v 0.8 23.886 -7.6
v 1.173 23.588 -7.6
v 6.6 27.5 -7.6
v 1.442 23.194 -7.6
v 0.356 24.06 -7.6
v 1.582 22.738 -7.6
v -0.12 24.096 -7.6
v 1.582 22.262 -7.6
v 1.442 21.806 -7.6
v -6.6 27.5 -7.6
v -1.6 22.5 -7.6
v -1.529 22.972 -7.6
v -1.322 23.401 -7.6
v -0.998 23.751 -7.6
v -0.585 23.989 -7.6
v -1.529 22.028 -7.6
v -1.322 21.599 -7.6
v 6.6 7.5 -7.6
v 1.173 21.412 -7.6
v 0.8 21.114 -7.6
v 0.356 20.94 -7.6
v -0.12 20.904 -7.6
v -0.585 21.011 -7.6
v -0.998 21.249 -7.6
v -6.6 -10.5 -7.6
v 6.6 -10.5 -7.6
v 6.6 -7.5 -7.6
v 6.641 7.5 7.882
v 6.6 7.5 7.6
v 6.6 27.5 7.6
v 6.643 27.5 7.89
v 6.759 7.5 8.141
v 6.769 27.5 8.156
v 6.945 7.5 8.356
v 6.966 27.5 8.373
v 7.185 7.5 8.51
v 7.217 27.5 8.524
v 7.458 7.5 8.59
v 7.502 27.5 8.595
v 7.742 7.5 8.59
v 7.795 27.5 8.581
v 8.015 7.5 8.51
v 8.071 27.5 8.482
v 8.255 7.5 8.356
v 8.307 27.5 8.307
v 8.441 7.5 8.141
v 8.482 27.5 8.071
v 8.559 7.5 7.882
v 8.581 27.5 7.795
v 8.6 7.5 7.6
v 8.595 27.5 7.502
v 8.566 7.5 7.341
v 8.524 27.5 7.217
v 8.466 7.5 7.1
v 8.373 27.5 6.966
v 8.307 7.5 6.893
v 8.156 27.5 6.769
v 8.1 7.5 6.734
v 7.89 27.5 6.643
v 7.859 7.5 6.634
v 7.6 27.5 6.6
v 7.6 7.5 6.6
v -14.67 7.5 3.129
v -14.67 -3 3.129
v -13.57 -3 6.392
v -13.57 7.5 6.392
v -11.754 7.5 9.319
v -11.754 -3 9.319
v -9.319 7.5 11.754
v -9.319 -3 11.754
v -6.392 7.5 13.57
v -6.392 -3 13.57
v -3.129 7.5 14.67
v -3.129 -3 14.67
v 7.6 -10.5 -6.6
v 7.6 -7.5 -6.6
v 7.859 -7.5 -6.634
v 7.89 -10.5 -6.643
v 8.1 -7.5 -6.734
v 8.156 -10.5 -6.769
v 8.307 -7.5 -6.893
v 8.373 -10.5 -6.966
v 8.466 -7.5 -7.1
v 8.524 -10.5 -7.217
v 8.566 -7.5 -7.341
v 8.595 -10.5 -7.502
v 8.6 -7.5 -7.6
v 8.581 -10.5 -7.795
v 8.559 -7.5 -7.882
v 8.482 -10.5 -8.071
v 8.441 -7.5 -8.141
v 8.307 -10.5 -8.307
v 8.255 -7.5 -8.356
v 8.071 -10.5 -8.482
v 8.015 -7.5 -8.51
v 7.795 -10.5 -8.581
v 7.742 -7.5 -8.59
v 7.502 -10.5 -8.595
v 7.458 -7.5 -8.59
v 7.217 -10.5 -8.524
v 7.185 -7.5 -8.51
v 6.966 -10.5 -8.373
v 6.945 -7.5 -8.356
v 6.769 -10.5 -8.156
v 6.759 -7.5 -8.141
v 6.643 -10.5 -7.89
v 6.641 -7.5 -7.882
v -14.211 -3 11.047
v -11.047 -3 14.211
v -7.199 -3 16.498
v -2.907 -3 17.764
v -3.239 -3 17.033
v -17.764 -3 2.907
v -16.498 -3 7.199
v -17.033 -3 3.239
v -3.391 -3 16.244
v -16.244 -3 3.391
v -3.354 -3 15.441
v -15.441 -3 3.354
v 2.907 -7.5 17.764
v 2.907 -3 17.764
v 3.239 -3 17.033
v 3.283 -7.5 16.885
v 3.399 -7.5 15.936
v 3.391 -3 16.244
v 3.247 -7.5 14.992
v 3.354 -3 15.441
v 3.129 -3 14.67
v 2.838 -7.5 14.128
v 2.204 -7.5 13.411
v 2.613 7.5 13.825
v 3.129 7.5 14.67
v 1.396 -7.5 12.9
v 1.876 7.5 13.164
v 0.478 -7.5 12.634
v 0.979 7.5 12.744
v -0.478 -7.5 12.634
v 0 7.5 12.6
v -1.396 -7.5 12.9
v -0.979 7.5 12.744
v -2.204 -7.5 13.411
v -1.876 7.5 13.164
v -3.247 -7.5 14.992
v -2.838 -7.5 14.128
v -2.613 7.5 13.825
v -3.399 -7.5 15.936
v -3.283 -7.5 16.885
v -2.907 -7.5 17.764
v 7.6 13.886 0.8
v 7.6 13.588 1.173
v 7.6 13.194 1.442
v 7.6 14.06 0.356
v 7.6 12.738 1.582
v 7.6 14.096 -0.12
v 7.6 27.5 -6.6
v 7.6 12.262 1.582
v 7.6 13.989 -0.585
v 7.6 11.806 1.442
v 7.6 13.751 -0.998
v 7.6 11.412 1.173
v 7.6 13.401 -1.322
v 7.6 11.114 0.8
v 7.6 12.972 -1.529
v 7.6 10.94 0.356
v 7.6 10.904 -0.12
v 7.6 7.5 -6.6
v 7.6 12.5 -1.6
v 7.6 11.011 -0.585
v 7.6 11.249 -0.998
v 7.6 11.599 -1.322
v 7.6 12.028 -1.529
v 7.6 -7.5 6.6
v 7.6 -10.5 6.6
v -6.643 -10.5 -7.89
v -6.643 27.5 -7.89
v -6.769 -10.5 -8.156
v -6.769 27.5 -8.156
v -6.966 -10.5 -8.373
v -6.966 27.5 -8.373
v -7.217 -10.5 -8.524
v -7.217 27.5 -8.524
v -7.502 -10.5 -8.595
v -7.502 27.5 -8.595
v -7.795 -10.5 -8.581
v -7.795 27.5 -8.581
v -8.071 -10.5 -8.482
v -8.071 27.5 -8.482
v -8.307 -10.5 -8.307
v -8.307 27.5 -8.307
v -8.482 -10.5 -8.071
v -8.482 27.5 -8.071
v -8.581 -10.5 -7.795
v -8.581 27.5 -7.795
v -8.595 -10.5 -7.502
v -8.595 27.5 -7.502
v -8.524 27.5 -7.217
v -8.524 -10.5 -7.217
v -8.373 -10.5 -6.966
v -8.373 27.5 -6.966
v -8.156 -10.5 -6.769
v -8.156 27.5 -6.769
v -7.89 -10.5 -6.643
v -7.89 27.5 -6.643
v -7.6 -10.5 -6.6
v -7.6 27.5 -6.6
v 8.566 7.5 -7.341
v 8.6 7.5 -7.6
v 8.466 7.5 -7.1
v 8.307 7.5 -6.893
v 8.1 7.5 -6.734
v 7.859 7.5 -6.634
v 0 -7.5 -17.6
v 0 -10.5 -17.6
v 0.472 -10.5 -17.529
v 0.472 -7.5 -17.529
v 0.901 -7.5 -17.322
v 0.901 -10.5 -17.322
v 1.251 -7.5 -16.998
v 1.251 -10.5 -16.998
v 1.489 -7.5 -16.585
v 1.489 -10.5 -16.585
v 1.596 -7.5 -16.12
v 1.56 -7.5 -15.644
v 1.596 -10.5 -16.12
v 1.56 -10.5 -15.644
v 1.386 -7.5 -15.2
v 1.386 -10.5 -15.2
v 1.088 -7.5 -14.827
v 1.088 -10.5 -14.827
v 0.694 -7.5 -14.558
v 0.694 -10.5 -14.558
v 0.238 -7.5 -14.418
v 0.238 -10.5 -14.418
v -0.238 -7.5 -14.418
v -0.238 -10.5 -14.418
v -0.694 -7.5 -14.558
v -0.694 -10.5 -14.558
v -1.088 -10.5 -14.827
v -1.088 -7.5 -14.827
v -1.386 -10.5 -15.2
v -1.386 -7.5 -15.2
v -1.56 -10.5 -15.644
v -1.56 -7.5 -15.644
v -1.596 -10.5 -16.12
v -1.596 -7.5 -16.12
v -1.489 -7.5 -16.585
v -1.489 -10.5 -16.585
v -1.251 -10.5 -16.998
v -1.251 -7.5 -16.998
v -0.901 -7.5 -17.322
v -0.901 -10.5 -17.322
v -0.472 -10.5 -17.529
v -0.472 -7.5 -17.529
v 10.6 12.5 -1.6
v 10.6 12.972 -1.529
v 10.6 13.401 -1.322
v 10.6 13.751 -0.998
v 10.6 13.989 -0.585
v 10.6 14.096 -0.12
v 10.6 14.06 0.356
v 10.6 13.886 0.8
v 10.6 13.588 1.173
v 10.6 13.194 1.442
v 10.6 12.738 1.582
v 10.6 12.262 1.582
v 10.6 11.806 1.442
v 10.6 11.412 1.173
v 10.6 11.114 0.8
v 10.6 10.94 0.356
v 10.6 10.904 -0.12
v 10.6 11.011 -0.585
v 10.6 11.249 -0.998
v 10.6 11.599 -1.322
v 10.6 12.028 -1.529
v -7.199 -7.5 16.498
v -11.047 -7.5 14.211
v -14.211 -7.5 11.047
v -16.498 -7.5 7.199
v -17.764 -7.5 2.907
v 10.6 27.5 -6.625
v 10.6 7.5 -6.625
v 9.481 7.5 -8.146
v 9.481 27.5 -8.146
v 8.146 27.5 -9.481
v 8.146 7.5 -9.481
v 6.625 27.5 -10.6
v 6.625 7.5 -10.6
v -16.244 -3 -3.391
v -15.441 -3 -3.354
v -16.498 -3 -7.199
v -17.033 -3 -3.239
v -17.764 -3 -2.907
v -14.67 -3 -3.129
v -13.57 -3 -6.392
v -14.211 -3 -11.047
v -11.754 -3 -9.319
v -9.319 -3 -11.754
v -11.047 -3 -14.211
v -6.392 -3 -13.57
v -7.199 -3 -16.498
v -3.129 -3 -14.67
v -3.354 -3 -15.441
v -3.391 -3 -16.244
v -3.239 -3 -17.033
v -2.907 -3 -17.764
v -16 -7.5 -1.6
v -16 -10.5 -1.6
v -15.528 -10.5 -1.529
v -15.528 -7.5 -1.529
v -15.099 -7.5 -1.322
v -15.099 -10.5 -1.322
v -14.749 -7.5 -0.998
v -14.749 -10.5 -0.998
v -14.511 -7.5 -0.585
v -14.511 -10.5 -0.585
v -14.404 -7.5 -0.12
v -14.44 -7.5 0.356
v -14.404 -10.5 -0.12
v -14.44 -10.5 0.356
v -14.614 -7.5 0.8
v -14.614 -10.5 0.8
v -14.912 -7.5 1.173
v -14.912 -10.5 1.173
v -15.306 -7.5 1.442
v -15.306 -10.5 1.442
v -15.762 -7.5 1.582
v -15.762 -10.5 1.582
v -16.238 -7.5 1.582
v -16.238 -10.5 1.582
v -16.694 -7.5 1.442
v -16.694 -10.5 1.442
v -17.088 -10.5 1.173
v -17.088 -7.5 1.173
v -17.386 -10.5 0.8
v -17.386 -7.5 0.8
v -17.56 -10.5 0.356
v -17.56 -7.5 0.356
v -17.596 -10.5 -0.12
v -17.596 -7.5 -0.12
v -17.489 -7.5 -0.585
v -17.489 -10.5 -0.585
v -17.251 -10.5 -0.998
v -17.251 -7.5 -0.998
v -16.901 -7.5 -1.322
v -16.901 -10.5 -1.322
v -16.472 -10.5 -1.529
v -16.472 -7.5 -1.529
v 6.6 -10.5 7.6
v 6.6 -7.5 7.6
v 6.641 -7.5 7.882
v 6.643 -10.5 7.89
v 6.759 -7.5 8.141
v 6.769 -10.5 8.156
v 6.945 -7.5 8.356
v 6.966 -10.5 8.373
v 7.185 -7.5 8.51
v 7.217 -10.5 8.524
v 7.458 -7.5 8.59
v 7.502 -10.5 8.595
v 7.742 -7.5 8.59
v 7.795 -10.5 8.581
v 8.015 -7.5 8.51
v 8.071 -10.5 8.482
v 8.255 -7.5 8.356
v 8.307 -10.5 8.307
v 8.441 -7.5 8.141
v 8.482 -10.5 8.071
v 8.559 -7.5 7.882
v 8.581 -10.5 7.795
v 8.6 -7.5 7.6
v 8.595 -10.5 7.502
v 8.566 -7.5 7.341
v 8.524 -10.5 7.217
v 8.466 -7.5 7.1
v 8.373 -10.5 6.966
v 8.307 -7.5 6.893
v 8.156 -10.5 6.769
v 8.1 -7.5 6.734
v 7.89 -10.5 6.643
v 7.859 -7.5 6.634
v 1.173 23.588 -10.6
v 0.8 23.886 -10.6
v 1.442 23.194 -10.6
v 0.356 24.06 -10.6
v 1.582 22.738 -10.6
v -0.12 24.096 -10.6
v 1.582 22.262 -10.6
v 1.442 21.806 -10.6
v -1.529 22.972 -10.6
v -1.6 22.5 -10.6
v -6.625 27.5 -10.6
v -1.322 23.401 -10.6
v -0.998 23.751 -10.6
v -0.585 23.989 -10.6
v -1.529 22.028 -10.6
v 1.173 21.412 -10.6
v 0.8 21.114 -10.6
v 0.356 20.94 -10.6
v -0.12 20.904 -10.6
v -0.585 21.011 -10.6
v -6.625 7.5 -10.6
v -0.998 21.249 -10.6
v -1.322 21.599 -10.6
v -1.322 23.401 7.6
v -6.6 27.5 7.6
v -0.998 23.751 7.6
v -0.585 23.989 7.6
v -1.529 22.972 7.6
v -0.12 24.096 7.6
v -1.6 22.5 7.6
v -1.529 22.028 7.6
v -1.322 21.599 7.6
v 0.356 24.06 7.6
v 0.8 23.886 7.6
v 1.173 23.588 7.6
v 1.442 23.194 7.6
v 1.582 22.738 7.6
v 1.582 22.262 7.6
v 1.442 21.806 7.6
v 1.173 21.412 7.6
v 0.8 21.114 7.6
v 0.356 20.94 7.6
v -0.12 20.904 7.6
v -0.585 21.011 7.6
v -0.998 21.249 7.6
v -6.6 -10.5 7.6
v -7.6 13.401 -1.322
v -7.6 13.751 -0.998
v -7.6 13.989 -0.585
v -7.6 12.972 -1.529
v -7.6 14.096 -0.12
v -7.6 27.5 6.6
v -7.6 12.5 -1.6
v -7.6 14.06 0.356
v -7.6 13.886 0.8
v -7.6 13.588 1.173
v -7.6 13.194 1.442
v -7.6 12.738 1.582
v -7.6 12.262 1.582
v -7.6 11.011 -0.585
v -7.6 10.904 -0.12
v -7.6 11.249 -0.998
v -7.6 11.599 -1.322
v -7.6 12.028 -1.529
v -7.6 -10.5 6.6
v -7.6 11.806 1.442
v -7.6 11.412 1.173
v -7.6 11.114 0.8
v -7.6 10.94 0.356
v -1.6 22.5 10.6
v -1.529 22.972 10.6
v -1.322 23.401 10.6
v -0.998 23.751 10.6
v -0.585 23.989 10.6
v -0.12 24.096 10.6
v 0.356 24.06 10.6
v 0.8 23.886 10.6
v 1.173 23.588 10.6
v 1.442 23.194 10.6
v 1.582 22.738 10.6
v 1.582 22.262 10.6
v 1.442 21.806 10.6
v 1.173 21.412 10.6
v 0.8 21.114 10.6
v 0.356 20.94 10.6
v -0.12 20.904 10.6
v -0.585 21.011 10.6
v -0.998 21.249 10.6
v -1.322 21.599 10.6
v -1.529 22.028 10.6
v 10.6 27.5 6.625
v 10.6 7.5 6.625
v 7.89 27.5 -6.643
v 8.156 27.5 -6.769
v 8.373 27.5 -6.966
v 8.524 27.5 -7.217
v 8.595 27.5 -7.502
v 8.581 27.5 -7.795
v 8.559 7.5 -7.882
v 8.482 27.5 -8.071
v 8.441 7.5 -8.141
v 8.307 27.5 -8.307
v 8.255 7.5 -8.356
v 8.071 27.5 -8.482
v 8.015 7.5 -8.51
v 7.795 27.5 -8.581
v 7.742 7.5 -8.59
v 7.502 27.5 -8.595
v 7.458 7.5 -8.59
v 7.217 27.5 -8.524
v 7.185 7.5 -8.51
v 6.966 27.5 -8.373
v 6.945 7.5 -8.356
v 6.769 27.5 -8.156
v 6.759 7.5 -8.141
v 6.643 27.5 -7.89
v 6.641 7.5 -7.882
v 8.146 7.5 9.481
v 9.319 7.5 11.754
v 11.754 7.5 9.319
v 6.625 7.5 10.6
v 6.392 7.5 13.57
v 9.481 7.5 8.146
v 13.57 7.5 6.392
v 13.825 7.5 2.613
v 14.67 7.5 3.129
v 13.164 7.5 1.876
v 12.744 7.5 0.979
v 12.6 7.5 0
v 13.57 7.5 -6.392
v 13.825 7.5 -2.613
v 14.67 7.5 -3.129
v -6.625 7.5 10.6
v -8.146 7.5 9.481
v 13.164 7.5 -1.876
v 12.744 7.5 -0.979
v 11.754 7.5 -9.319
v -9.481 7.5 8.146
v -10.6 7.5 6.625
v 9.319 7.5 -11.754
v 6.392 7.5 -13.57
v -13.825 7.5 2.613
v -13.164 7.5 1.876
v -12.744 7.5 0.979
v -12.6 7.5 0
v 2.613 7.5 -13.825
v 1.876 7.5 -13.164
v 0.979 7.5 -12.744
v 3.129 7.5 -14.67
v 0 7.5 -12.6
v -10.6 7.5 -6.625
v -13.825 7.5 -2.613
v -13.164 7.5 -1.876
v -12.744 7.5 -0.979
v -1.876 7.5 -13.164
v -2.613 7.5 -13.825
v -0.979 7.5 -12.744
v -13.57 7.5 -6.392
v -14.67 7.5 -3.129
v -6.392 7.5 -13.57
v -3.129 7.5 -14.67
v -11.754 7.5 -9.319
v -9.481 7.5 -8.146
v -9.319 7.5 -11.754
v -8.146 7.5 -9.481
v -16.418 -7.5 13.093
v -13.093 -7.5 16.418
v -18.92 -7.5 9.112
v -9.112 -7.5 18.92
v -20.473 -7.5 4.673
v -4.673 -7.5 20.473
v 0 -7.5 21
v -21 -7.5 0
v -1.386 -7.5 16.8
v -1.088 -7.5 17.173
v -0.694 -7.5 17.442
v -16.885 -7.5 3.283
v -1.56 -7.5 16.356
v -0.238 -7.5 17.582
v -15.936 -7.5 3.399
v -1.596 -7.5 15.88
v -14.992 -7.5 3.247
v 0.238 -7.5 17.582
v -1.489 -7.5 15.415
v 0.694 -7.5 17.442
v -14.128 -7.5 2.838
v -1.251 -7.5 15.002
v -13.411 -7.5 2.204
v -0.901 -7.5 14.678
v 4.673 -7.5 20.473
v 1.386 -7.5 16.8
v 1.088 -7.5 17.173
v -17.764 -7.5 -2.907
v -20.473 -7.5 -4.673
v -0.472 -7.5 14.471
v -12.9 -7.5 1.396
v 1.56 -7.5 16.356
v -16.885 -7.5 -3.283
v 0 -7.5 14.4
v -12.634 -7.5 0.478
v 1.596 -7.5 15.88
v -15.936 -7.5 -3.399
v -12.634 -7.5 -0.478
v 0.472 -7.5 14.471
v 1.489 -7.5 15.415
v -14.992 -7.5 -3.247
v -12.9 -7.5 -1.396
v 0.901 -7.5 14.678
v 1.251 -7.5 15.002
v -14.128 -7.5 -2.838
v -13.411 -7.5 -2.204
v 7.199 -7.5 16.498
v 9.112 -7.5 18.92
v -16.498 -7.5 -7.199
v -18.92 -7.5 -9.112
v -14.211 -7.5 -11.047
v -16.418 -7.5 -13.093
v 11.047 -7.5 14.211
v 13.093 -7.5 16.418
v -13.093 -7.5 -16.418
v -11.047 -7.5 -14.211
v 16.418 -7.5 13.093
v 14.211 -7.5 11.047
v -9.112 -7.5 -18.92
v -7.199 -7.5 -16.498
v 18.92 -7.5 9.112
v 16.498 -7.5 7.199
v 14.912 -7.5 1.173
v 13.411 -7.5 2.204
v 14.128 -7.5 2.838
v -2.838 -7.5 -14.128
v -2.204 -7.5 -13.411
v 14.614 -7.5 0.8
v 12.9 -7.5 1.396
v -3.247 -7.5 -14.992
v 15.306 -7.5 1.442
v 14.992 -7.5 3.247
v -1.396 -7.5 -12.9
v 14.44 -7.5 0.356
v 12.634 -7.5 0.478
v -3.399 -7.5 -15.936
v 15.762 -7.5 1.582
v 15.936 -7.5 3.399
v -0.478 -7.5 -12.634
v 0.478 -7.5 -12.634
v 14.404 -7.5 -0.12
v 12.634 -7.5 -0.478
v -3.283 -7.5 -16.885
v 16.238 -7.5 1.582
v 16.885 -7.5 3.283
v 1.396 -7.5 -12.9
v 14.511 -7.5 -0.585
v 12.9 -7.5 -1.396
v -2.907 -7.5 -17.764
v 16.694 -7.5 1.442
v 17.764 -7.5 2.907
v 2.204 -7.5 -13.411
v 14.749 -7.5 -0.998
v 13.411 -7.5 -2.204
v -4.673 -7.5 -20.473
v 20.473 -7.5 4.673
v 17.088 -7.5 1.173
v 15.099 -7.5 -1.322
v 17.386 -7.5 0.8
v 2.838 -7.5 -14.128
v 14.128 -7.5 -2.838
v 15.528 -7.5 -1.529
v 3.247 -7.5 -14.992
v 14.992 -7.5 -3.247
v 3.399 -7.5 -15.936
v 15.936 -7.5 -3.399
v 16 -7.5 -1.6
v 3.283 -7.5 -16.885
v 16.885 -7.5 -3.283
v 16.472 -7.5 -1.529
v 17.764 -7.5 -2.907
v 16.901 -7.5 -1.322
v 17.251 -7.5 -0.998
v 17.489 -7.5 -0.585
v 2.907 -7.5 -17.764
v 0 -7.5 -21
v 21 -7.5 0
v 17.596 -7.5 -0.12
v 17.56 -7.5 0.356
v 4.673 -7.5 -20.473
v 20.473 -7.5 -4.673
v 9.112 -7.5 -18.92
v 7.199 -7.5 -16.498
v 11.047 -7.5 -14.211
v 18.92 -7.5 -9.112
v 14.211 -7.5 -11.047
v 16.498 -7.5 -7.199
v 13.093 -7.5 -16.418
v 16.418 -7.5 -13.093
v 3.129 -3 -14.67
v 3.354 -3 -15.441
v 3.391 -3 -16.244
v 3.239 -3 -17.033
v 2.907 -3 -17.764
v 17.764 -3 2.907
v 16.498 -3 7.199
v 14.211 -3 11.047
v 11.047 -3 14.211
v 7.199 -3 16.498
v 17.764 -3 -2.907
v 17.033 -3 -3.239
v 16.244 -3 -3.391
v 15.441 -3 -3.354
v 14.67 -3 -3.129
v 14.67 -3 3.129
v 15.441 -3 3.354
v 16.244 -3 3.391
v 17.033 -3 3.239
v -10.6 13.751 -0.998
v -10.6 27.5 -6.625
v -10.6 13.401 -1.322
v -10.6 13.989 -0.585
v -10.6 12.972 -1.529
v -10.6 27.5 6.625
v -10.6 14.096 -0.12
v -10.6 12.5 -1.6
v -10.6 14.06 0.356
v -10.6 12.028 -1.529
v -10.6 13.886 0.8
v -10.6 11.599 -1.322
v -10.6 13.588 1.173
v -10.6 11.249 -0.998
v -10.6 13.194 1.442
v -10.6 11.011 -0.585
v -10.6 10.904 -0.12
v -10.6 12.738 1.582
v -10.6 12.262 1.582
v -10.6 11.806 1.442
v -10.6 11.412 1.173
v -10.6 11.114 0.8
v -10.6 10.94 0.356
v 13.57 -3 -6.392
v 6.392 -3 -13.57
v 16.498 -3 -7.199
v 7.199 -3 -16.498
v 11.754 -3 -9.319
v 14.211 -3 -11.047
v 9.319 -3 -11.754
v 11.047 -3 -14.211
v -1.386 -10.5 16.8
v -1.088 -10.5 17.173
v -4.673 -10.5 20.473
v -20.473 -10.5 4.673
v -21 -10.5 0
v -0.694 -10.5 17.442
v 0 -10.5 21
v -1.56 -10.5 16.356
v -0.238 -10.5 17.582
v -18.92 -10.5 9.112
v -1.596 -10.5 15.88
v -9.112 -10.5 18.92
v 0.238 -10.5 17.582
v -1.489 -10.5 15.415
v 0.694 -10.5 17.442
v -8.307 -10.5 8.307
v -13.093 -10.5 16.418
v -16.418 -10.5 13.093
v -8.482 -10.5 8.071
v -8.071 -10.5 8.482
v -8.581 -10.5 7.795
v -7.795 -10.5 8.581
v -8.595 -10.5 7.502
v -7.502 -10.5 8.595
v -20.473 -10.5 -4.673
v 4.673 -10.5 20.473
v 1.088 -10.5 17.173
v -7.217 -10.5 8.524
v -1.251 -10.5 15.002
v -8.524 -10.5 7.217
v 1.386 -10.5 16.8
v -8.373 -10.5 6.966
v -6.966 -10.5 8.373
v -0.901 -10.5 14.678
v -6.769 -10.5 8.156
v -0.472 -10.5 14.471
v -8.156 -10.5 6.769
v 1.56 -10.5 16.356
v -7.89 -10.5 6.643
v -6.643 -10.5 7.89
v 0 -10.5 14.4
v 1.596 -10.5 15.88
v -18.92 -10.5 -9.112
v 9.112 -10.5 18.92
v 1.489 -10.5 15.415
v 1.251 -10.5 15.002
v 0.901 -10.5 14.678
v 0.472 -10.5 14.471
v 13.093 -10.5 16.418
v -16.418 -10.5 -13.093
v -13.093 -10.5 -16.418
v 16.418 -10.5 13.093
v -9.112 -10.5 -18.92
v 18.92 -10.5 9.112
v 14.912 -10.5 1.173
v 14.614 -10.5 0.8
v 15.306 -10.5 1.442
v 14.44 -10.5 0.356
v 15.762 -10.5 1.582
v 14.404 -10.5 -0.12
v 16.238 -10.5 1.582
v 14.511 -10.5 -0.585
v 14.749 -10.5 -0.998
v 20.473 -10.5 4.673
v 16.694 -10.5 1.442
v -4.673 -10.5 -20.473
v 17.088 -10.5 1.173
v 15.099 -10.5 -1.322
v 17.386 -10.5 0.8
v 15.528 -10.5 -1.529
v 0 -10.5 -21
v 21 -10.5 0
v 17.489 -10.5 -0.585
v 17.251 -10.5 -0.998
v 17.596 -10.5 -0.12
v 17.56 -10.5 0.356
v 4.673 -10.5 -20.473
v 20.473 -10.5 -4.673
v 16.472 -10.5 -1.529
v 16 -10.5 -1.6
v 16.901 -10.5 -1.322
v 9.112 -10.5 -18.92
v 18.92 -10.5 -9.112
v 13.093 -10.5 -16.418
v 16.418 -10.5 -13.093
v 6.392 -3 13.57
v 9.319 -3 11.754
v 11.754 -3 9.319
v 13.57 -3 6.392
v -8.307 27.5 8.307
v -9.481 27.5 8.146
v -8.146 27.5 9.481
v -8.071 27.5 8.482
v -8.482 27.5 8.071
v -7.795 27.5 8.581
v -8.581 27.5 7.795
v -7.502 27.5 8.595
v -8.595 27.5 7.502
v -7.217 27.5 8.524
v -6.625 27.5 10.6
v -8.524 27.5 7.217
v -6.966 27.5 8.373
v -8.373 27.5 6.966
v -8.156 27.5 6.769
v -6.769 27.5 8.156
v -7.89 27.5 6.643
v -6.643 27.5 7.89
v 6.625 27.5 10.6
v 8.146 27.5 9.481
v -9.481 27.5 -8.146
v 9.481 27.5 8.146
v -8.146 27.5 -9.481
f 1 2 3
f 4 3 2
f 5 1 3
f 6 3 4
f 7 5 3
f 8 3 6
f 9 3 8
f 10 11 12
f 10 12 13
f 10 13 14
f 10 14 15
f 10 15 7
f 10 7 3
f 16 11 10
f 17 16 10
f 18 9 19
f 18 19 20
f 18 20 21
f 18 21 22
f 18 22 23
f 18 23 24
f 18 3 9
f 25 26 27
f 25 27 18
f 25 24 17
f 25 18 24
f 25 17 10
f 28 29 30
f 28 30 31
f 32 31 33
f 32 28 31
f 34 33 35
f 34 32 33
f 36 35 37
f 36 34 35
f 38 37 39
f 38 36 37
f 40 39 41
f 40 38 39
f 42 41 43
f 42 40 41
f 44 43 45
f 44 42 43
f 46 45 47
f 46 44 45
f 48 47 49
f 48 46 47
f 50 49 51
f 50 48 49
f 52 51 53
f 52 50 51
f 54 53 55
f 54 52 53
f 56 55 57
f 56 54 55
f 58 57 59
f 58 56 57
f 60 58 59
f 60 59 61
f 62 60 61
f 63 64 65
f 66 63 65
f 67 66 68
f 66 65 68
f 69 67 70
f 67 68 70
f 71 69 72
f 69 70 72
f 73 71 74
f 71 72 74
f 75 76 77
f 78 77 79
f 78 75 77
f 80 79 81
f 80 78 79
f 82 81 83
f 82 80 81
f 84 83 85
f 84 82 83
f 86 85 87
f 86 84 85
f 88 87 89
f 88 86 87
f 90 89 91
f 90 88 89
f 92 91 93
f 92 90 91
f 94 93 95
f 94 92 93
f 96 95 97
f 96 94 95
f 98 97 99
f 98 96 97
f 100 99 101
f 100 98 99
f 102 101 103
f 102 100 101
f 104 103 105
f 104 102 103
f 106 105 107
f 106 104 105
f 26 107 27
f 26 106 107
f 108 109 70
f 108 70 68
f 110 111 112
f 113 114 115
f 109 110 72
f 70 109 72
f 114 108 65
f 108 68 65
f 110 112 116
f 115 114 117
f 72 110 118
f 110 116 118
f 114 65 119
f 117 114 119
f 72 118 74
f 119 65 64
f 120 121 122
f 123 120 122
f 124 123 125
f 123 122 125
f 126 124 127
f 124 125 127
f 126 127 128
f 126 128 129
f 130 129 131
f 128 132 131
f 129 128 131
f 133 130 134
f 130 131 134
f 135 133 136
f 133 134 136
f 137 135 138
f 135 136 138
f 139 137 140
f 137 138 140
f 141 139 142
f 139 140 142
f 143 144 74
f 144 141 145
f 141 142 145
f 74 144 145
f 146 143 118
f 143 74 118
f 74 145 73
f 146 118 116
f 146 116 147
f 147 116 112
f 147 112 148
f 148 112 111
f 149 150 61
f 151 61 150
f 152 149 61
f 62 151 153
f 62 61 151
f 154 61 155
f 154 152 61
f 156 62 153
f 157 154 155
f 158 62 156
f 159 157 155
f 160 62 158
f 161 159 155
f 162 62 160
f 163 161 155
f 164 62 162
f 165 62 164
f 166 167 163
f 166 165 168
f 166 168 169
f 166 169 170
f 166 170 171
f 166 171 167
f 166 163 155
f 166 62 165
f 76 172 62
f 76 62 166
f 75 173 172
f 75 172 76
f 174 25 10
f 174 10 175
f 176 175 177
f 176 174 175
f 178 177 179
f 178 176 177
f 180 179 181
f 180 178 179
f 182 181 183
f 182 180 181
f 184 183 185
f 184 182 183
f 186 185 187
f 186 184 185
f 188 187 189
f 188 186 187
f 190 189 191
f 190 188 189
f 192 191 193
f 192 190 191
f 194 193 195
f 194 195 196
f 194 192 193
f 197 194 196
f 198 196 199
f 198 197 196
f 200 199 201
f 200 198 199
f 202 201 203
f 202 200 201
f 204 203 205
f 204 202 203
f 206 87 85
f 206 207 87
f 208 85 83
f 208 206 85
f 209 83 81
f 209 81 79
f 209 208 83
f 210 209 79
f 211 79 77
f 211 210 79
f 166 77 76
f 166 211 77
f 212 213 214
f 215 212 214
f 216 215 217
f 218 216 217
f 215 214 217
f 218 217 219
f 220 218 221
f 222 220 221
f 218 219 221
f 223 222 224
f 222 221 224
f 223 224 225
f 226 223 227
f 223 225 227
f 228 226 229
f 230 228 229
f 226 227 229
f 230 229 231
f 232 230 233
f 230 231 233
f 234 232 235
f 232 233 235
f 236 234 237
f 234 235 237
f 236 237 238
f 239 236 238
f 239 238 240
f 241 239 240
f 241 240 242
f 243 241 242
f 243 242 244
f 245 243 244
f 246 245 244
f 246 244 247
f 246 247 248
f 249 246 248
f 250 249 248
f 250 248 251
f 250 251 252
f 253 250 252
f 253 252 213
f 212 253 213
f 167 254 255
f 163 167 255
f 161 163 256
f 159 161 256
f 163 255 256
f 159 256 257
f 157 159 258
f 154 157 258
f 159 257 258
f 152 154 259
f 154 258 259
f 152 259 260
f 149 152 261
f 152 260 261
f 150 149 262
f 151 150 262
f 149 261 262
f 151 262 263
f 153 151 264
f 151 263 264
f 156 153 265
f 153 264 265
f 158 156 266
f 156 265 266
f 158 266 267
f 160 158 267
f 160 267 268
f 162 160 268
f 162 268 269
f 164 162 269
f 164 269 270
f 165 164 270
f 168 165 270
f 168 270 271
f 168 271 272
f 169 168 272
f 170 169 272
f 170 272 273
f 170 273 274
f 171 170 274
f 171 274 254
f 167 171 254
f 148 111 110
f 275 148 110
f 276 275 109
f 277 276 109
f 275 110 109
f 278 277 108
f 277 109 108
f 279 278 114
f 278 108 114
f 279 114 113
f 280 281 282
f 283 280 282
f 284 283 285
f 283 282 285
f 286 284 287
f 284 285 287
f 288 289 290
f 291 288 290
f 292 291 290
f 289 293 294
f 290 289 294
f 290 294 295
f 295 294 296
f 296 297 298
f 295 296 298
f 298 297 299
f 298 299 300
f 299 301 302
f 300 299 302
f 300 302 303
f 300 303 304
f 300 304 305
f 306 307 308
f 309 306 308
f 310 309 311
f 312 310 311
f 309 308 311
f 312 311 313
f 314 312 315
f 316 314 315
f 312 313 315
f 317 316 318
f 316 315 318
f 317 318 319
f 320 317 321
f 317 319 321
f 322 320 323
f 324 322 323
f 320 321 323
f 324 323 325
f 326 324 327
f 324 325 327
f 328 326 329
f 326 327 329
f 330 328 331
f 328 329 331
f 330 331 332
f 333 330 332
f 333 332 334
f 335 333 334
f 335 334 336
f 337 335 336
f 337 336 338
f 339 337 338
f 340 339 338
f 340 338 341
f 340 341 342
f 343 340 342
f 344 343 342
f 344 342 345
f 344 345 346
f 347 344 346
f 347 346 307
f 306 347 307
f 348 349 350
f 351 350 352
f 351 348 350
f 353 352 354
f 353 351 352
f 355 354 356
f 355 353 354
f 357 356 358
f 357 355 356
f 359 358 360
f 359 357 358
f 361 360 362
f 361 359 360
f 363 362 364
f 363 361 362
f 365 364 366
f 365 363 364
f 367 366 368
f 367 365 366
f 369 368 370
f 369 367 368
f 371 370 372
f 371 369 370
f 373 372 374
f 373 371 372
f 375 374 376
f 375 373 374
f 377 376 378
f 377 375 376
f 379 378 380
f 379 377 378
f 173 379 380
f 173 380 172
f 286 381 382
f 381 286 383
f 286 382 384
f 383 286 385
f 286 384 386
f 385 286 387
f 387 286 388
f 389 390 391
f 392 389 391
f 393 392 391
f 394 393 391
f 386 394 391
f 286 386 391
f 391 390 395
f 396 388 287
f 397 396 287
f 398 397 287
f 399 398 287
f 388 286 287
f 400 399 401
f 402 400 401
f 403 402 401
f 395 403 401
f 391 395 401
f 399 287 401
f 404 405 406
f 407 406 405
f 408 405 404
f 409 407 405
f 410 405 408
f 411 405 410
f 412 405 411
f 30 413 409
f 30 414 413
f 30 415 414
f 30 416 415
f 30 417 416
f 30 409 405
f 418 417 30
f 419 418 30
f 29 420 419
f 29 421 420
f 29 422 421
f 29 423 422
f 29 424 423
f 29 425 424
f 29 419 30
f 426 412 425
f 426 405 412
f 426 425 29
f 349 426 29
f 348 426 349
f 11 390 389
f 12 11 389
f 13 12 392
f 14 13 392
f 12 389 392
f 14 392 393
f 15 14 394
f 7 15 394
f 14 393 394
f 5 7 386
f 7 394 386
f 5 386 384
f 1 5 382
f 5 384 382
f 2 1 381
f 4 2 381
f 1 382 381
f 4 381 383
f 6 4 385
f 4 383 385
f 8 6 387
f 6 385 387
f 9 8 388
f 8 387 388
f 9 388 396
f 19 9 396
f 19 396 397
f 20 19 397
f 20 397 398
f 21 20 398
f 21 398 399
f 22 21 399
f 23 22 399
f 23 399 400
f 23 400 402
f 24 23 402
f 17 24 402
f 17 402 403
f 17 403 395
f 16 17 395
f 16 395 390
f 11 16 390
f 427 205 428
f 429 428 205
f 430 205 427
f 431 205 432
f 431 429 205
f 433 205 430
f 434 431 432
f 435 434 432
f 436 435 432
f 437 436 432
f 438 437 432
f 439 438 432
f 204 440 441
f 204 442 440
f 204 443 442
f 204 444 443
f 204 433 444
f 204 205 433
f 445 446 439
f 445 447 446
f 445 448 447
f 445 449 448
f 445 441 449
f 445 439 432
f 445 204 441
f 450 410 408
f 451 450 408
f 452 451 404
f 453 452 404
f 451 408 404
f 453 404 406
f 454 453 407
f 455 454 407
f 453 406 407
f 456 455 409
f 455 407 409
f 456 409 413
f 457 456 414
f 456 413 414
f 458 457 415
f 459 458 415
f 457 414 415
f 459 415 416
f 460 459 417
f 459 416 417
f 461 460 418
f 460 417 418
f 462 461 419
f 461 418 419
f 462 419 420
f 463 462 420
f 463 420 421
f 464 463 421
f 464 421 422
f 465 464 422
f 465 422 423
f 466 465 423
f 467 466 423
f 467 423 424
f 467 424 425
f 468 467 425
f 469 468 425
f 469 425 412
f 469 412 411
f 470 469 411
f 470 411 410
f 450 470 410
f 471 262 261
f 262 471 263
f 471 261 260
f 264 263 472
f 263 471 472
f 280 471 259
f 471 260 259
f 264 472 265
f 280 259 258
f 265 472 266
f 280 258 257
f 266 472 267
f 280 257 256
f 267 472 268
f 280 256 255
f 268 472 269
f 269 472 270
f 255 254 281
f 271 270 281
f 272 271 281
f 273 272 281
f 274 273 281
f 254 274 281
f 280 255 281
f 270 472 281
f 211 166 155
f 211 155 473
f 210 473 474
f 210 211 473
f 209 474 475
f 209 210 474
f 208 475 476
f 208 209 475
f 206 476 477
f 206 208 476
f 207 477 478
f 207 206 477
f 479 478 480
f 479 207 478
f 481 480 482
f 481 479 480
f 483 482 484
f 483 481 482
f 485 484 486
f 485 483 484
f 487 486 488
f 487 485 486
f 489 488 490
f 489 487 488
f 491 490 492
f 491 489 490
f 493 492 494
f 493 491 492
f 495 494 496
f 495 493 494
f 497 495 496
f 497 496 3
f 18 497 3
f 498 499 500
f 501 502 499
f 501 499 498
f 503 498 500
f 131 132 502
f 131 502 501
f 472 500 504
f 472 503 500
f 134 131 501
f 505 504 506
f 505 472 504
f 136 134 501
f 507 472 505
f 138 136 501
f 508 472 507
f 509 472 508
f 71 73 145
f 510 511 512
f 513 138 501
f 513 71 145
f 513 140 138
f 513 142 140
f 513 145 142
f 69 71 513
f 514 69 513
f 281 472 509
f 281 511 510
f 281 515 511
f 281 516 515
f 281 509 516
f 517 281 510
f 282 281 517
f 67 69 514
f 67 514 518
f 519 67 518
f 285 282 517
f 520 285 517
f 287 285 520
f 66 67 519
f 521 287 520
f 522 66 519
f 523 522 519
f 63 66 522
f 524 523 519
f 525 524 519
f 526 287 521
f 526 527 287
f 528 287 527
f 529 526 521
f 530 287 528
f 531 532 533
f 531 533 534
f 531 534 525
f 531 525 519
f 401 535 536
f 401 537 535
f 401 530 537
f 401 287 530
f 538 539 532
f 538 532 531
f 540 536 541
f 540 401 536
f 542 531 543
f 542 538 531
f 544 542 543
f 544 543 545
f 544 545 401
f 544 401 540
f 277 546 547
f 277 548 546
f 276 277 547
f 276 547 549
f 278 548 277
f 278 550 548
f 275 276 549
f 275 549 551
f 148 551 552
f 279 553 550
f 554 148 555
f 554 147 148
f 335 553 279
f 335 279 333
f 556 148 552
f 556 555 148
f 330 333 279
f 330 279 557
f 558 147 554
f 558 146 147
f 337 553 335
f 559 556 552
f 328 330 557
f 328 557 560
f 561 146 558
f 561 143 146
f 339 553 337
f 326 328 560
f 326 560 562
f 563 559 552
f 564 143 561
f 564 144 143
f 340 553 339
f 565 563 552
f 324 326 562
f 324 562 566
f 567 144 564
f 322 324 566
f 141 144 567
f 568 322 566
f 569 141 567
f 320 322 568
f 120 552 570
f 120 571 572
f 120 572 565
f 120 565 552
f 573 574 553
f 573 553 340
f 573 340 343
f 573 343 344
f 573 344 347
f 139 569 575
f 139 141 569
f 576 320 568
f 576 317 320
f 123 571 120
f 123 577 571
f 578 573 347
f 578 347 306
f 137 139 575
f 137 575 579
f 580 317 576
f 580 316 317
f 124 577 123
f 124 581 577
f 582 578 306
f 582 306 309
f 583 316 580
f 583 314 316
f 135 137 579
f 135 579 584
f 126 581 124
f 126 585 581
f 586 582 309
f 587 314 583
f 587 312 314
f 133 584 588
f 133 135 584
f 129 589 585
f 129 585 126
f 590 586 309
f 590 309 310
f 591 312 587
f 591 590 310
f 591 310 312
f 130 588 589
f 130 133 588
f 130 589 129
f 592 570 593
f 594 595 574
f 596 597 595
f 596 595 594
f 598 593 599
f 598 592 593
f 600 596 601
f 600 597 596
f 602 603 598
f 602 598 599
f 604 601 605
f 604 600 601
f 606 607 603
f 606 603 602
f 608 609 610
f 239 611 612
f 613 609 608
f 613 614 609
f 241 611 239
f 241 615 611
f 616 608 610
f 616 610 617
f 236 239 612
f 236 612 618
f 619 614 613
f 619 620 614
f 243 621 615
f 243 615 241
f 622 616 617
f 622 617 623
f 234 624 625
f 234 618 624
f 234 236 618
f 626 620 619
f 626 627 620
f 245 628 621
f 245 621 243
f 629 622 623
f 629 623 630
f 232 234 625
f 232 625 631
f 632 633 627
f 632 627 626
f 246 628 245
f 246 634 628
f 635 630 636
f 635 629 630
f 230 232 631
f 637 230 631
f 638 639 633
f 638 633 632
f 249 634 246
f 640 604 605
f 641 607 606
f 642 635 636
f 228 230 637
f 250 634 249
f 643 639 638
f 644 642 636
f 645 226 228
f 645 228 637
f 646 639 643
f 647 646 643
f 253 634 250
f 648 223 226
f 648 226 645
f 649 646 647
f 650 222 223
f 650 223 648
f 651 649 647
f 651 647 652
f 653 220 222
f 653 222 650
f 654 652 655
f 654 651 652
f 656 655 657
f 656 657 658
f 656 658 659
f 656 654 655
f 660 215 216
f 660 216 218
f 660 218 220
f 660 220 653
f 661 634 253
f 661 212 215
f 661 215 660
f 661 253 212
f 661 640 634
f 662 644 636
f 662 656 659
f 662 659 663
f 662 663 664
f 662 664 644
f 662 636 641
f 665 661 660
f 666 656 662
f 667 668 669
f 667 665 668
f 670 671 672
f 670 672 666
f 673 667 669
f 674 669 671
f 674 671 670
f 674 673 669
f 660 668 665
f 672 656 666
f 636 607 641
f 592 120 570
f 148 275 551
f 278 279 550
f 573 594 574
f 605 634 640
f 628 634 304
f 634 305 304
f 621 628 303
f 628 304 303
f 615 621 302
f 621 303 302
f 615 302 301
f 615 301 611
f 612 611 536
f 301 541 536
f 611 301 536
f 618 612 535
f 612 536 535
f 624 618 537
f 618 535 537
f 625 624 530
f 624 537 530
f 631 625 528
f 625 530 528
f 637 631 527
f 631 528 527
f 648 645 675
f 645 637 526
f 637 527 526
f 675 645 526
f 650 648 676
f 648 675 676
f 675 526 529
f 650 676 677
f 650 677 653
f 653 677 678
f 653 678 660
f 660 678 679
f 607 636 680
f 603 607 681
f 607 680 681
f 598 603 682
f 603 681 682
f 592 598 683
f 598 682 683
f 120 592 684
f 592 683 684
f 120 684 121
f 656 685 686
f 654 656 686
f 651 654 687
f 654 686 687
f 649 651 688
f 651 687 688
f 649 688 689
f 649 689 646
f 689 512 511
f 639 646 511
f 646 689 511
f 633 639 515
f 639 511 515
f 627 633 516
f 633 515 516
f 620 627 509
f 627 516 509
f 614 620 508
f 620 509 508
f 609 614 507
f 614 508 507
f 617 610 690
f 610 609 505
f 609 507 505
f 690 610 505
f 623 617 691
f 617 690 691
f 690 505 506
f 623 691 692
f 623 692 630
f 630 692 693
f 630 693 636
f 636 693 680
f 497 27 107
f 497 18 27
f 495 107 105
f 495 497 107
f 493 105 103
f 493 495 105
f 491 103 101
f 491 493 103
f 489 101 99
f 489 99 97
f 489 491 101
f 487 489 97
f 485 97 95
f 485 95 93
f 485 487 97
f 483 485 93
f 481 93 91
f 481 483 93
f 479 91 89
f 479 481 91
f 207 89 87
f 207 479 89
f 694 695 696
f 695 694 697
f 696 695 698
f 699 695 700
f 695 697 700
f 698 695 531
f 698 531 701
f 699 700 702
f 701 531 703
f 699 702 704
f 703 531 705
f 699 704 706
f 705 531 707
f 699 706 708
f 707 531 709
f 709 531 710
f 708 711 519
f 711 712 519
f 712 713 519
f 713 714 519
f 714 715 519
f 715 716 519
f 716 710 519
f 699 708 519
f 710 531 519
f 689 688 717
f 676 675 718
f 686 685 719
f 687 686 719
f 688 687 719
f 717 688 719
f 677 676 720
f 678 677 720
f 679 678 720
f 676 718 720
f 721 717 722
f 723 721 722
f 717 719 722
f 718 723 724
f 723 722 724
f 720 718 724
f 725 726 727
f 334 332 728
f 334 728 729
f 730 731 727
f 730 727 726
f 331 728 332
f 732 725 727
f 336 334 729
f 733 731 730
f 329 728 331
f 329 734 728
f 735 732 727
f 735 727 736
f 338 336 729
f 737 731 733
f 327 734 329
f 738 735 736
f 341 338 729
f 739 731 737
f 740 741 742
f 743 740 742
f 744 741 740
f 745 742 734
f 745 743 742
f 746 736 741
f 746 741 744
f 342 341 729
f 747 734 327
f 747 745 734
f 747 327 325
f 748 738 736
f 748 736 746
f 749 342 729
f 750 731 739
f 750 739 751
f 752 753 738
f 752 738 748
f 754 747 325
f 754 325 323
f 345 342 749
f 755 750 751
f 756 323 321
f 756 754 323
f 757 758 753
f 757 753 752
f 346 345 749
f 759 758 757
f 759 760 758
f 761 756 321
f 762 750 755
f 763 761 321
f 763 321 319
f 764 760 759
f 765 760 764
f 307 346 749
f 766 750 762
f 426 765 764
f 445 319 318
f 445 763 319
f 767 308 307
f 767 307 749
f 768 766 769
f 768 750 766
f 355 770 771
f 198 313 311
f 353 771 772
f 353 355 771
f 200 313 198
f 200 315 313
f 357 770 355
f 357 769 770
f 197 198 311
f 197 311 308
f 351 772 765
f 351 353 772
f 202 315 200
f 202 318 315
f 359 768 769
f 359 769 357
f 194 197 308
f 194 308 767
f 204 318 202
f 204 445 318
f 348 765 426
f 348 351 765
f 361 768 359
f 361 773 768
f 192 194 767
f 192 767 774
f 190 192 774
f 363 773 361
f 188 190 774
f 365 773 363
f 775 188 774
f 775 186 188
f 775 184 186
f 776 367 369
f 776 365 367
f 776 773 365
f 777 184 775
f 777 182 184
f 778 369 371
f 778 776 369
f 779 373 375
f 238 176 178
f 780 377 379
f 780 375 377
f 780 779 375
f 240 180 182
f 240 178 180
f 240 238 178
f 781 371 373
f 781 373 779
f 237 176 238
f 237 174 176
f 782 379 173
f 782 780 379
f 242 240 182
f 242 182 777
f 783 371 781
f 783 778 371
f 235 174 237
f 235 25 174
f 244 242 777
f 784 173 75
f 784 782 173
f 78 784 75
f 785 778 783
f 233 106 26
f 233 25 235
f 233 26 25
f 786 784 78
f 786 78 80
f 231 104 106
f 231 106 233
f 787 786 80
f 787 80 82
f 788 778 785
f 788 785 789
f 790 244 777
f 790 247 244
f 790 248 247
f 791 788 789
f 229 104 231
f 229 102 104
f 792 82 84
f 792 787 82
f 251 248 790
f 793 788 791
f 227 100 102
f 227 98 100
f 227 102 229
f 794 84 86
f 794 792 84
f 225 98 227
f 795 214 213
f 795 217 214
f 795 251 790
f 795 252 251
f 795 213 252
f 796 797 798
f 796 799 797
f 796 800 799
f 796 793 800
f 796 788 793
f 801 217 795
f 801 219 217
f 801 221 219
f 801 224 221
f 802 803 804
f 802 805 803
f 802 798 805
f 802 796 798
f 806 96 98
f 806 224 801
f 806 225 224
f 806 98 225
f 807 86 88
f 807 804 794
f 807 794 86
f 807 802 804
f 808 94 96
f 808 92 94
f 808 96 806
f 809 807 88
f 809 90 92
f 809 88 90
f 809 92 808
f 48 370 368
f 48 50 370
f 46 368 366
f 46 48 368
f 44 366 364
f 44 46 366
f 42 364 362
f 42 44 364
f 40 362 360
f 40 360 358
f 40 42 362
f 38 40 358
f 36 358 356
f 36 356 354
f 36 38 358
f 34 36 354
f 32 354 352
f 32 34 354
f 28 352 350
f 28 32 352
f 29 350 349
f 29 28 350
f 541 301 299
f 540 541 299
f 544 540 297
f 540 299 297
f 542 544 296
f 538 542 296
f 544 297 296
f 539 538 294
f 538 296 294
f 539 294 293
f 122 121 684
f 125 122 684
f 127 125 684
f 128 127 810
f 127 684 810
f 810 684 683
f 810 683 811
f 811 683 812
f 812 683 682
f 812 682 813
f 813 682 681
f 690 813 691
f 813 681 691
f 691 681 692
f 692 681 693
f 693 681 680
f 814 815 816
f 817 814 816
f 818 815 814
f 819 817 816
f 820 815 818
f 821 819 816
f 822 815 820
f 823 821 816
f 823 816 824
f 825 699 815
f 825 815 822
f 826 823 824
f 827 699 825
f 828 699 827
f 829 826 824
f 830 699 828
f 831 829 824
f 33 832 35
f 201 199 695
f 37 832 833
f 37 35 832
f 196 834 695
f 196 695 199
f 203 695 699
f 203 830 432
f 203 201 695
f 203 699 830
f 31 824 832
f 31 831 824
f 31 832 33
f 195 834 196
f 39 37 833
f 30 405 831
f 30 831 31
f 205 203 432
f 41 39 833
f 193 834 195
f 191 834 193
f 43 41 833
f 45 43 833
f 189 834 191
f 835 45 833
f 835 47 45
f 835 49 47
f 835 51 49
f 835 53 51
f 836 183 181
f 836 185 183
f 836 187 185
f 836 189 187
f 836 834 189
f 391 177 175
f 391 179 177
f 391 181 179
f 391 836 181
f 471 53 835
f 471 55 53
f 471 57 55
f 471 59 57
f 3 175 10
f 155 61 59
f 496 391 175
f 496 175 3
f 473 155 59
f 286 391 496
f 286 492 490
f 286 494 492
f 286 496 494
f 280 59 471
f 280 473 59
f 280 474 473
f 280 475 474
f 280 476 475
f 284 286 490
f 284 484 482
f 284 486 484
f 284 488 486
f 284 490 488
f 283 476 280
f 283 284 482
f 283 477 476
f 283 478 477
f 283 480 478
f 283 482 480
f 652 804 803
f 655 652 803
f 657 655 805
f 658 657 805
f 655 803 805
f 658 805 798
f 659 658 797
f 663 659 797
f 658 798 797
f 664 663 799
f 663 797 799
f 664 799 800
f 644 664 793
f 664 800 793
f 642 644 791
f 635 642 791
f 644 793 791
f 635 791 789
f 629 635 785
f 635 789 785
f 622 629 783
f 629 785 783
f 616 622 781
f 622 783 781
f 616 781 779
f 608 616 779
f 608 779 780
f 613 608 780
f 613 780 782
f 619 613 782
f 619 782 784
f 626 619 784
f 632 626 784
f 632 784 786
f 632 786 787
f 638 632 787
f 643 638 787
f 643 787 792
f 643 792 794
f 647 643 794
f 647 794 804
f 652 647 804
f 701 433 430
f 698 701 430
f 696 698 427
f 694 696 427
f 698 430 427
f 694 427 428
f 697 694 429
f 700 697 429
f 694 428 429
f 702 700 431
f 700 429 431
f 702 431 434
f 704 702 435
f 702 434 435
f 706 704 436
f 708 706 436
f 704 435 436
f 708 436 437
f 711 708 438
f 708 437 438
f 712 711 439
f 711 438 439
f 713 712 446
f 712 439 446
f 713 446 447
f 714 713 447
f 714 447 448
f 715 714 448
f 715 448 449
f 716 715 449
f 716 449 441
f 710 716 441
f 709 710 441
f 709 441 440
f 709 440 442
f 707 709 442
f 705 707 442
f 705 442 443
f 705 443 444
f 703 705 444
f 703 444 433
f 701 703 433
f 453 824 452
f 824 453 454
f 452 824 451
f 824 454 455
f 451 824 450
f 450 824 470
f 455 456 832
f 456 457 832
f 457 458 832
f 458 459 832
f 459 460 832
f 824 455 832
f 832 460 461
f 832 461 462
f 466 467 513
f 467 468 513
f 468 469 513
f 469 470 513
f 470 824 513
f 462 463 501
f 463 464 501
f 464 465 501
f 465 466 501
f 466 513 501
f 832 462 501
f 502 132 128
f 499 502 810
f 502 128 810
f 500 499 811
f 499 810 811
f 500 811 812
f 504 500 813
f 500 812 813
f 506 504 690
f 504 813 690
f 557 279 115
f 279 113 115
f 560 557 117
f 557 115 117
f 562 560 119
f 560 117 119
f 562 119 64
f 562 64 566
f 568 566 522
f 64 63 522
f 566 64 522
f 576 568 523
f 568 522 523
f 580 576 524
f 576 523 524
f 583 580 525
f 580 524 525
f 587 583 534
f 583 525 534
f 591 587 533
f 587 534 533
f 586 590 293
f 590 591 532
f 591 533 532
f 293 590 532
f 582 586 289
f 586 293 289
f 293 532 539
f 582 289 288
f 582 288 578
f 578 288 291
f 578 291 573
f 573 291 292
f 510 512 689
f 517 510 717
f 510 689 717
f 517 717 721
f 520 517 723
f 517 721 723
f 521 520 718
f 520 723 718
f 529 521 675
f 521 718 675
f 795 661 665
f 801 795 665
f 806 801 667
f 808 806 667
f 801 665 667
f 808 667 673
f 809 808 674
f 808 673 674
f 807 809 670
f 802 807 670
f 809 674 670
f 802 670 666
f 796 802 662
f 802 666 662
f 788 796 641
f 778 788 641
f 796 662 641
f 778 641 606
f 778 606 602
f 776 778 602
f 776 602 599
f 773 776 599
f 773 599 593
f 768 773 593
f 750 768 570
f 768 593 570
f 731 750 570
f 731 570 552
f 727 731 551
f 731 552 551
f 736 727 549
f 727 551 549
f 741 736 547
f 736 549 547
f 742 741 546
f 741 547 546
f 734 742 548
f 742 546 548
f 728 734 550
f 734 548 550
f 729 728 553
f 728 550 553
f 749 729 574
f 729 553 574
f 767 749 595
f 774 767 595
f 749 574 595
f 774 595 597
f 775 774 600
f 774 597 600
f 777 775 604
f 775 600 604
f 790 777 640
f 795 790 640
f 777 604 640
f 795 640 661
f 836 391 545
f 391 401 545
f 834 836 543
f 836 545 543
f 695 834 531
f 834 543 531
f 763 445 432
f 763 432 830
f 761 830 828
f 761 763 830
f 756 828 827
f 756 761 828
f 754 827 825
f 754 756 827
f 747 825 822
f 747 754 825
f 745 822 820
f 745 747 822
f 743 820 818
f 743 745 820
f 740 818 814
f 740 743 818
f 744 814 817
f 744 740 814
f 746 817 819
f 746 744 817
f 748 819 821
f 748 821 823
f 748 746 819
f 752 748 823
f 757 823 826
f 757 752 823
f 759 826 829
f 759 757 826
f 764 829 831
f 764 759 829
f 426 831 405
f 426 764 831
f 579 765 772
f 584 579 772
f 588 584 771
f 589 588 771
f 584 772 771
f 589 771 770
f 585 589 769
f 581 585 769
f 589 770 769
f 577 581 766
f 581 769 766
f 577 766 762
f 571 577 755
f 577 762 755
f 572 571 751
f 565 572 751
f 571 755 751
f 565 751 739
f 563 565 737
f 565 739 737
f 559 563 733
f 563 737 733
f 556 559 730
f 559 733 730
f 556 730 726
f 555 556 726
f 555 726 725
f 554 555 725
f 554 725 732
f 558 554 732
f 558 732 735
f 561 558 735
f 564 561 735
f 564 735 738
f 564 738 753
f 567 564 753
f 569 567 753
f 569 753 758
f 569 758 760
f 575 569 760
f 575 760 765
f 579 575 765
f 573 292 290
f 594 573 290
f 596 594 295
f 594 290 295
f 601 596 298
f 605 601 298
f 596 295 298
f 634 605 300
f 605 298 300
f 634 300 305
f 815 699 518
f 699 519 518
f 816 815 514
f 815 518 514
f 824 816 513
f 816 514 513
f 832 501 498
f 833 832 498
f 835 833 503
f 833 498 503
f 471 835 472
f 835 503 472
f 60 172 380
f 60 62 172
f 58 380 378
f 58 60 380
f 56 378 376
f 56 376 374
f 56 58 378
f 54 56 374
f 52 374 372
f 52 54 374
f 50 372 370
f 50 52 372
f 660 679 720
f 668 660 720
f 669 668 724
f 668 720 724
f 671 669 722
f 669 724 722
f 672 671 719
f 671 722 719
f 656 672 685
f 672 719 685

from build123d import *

# Parameters (mm, degrees)
SKETCH_1_R               = 12.5
EXTRUDE_1_DEPTH          = 7.5
EXTRUDE_2_DEPTH          = 10
EXTRUDE_START            = -4.5
SKETCH_3_R               = 18
SKETCH_3_R_2             = 12.5
EXTRUDE_3_DEPTH          = 4.5
SKETCH_4_R               = 2.1
CUT_EXTRUDE_1_DEPTH      = 39.055354
SKETCH_5_R               = 1.6
CUT_EXTRUDE_2_DEPTH      = 39.055354
CUT_EXTRUDE_START        = -10
CUT_EXTRUDE_3_DEPTH      = 10
SKETCH_7_R               = 21
EXTRUDE_4_DEPTH          = 3
SKETCH_8_R               = 1.6
CUT_EXTRUDE_4_DEPTH      = 41.816663
SKETCH_13_R              = 15
SKETCH_13_R_2            = 12.5
EXTRUDE_6_DEPTH          = 10.5
CUT_EXTRUDE_6_DEPTH      = 39.820098
CUT_EXTRUDE_6_DEPTH_BACK = 39.820098
CUT_EXTRUDE_START_2      = 10.5
SKETCH_9_R               = 3.4
CUT_EXTRUDE_5_DEPTH      = 15
EXTRUDE_5_DEPTH          = 10
SKETCH_12_R              = 1.6
CUT_EXTRUDE_7_DEPTH      = 47.859471


# Read off the part's stored shape, not the designer's step: 凸台-拉伸2
with BuildPart() as part:
    # 草图1 → 凸台-拉伸1 (new, symmetric)
    with BuildSketch(Plane(origin=(0, 0, 0), x_dir=(1, 0, 0), z_dir=(0, 1, 0))):
        with Locations(Location((0, 0, 0), (0, 0, 270))):
            Circle(SKETCH_1_R)
        with BuildLine():
            Line((6.6, -7.6), (-6.6, -7.6))
            ThreePointArc((-6.6, -7.6), (-8.307107, -8.307107), (-7.6, -6.6))
            Line((-7.6, -6.6), (-7.6, 6.6))
            ThreePointArc((-7.6, 6.6), (-8.307107, 8.307107), (-6.6, 7.6))
            Line((-6.6, 7.6), (6.6, 7.6))
            ThreePointArc((6.6, 7.6), (7.6, 8.6), (8.6, 7.6))
            ThreePointArc((8.6, 7.6), (8.307107, 6.892893), (7.6, 6.6))
            Line((7.6, 6.6), (7.6, -6.6))
            ThreePointArc((7.6, -6.6), (8.307107, -6.892893), (8.6, -7.6))
            ThreePointArc((8.6, -7.6), (7.6, -8.6), (6.6, -7.6))
        make_face(mode=Mode.SUBTRACT)
    extrude(amount=EXTRUDE_1_DEPTH, both=True)

    # 凸台-拉伸2 outline → 凸台-拉伸2 (add)
    with BuildSketch(Plane.XZ.offset(7.5)):
        with BuildLine():
            Line((10.6, -6.624953), (10.6, 6.624953))
            ThreePointArc((10.6, 6.624953), (8.838835, 8.838835), (6.624953, 10.6))
            Line((6.624953, 10.6), (-6.624953, 10.6))
            ThreePointArc((-6.624953, 10.6), (-8.838835, 8.838835), (-10.6, 6.624953))
            Line((-10.6, 6.624953), (-10.6, -6.624953))
            ThreePointArc((-10.6, -6.624953), (-8.838835, -8.838835), (-6.624953, -10.6))
            Line((-6.624953, -10.6), (6.624953, -10.6))
            ThreePointArc((6.624953, -10.6), (8.838835, -8.838835), (10.6, -6.624953))
        make_face()
        with BuildLine():
            ThreePointArc((-6.6, -7.6), (-8.307107, -8.307107), (-7.6, -6.6))
            Line((-7.6, -6.6), (-7.6, 6.6))
            ThreePointArc((-7.6, 6.6), (-8.307107, 8.307107), (-6.6, 7.6))
            Line((-6.6, 7.6), (6.6, 7.6))
            ThreePointArc((6.6, 7.6), (8.307107, 8.307107), (7.6, 6.6))
            Line((7.6, 6.6), (7.6, -6.6))
            ThreePointArc((7.6, -6.6), (8.307107, -8.307107), (6.6, -7.6))
            Line((6.6, -7.6), (-6.6, -7.6))
        make_face(mode=Mode.SUBTRACT)
    extrude_2 = extrude(amount=EXTRUDE_2_DEPTH)

    # 镜向1: 凸台-拉伸2 across plane
    add(extrude_2.mirror(Plane.ZX))

    # 草图3 → 凸台-拉伸3 (add)
    with BuildSketch(Plane.XZ.offset(7.5).offset(EXTRUDE_START)):
        with Locations(Location((0, 0, 0), (0, 0, 270))):
            Circle(SKETCH_3_R)
        with Locations(Location((0, 0, 0), (0, 0, 270))):
            Circle(SKETCH_3_R_2, mode=Mode.SUBTRACT)
    extrude(amount=EXTRUDE_3_DEPTH)

    # 草图4 → 切除-拉伸1 (cut, through all)
    with BuildSketch(Plane.XY.offset(10.6)):
        with Locations((0, -12.5)):
            Circle(SKETCH_4_R)
    extrude(amount=-CUT_EXTRUDE_1_DEPTH, mode=Mode.SUBTRACT)

    # 草图5 → 切除-拉伸2 (cut, through all)
    with BuildSketch(Plane(origin=(10.6, 0, 0), x_dir=(0, 0, -1), z_dir=(1, 0, 0))):
        with Locations((0, 12.5)):
            Circle(SKETCH_5_R)
    extrude(amount=-CUT_EXTRUDE_2_DEPTH, mode=Mode.SUBTRACT)

    # 草图6 → 切除-拉伸3 (cut)
    with BuildSketch(Plane.XZ.offset(17.5).offset(CUT_EXTRUDE_START)):
        with BuildLine():
            Line((10.6, -6.624953), (10.6, 6.624953))
            ThreePointArc((10.6, 6.624953), (8.838835, 8.838835), (6.624953, 10.6))
            Line((6.624953, 10.6), (-6.624953, 10.6))
            ThreePointArc((-6.624953, 10.6), (-8.838835, 8.838835), (-10.6, 6.624953))
            Line((-10.6, 6.624953), (-10.6, -6.624953))
            ThreePointArc((-10.6, -6.624953), (-8.838835, -8.838835), (-6.624953, -10.6))
            Line((-6.624953, -10.6), (6.624953, -10.6))
            ThreePointArc((6.624953, -10.6), (8.838835, -8.838835), (10.6, -6.624953))
        make_face()
    extrude(amount=CUT_EXTRUDE_3_DEPTH, mode=Mode.SUBTRACT)

    # 草图7 → 凸台-拉伸4 (add)
    with BuildSketch(Plane.XZ.offset(7.5)):
        with Locations(Location((0, 0, 0), (0, 0, 270))):
            Circle(SKETCH_7_R)
    extrude(amount=EXTRUDE_4_DEPTH)

    # 草图8 → 切除-拉伸4 (cut, through all)
    with BuildSketch(Plane.XZ.offset(10.5)):
        with Locations(Location((0, 16, 0), (0, 0, 270))):
            Circle(SKETCH_8_R)
        with Locations(Location((16, 0, 0), (0, 0, 270))):
            Circle(SKETCH_8_R)
        with Locations(Location((0, -16, 0), (0, 0, 270))):
            Circle(SKETCH_8_R)
        with Locations(Location((-16, 0, 0), (0, 0, 270))):
            Circle(SKETCH_8_R)
    extrude(amount=-CUT_EXTRUDE_4_DEPTH, mode=Mode.SUBTRACT)

    # 草图13 → 凸台-拉伸6 (add)
    with BuildSketch(Plane(origin=(0, -3, 0), x_dir=(1, 0, 0), z_dir=(0, 1, 0))):
        with Locations(Location((0, 0, 0), (0, 0, 85.379415))):
            Circle(SKETCH_13_R)
        Circle(SKETCH_13_R_2, mode=Mode.SUBTRACT)
    extrude(amount=EXTRUDE_6_DEPTH)

    # 草图10 → 切除-拉伸6 (cut, two sides: drawn at the far end of the back side and taken through both)
    with BuildSketch(Plane(origin=(0, -7.5, 0), x_dir=(1, 0, 0), z_dir=(0, 1, 0)).offset(-CUT_EXTRUDE_6_DEPTH_BACK)):
        with BuildLine():
            Line((-7.6, 6.6), (-7.6, -6.6))
            ThreePointArc((-7.6, -6.6), (-8.307107, -8.307107), (-6.6, -7.6))
            Line((-6.6, -7.6), (6.6, -7.6))
            ThreePointArc((6.6, -7.6), (8.307107, -8.307107), (7.6, -6.6))
            Line((7.6, -6.6), (7.6, 6.6))
            ThreePointArc((7.6, 6.6), (8.307107, 8.307107), (6.6, 7.6))
            Line((6.6, 7.6), (-6.6, 7.6))
            ThreePointArc((-6.6, 7.6), (-8.307107, 8.307107), (-7.6, 6.6))
        make_face()
    extrude(amount=CUT_EXTRUDE_6_DEPTH + CUT_EXTRUDE_6_DEPTH_BACK, mode=Mode.SUBTRACT)

    # 草图9 → 切除-拉伸5 (cut)
    with BuildSketch(Plane(origin=(0, -3, 0), x_dir=(1, 0, 0), z_dir=(0, 1, 0)).offset(CUT_EXTRUDE_START_2)):
        with Locations((0, -16)):
            Circle(SKETCH_9_R)
        with Locations((16, 0)):
            Circle(SKETCH_9_R)
        with Locations((0, 16)):
            Circle(SKETCH_9_R)
        with Locations((-16, 0)):
            Circle(SKETCH_9_R)
    extrude(amount=-CUT_EXTRUDE_5_DEPTH, mode=Mode.SUBTRACT)

    # 草图11 → 凸台-拉伸5 (add)
    with BuildSketch(Plane(origin=(0, 17.5, 0), x_dir=(1, 0, 0), z_dir=(0, 1, 0))):
        with BuildLine():
            Line((6.624953, 10.6), (-6.624953, 10.6))
            ThreePointArc((-6.624953, 10.6), (-8.838835, 8.838835), (-10.6, 6.624953))
            Line((-10.6, 6.624953), (-10.6, -6.624953))
            ThreePointArc((-10.6, -6.624953), (-8.838835, -8.838835), (-6.624953, -10.6))
            Line((-6.624953, -10.6), (6.624953, -10.6))
            ThreePointArc((6.624953, -10.6), (8.838835, -8.838835), (10.6, -6.624953))
            Line((10.6, -6.624953), (10.6, 6.624953))
            ThreePointArc((10.6, 6.624953), (8.838835, 8.838835), (6.624953, 10.6))
        make_face()
        with BuildLine():
            Line((-6.6, -7.6), (6.6, -7.6))
            ThreePointArc((6.6, -7.6), (8.307107, -8.307107), (7.6, -6.6))
            Line((7.6, -6.6), (7.6, 6.6))
            ThreePointArc((7.6, 6.6), (8.307107, 8.307107), (6.6, 7.6))
            Line((6.6, 7.6), (-6.6, 7.6))
            ThreePointArc((-6.6, 7.6), (-8.307107, 8.307107), (-7.6, 6.6))
            Line((-7.6, 6.6), (-7.6, -6.6))
            ThreePointArc((-7.6, -6.6), (-8.307107, -8.307107), (-6.6, -7.6))
        make_face(mode=Mode.SUBTRACT)
    extrude(amount=EXTRUDE_5_DEPTH)

    # 草图12 → 切除-拉伸7 (cut, through all)
    with BuildSketch(Plane(origin=(0, 0, -10.6), x_dir=(-1, 0, 0), z_dir=(0, 0, -1))):
        with Locations((0, 22.5)):
            Circle(SKETCH_12_R)
    extrude(amount=-CUT_EXTRUDE_7_DEPTH, mode=Mode.SUBTRACT)


solid = part.part
